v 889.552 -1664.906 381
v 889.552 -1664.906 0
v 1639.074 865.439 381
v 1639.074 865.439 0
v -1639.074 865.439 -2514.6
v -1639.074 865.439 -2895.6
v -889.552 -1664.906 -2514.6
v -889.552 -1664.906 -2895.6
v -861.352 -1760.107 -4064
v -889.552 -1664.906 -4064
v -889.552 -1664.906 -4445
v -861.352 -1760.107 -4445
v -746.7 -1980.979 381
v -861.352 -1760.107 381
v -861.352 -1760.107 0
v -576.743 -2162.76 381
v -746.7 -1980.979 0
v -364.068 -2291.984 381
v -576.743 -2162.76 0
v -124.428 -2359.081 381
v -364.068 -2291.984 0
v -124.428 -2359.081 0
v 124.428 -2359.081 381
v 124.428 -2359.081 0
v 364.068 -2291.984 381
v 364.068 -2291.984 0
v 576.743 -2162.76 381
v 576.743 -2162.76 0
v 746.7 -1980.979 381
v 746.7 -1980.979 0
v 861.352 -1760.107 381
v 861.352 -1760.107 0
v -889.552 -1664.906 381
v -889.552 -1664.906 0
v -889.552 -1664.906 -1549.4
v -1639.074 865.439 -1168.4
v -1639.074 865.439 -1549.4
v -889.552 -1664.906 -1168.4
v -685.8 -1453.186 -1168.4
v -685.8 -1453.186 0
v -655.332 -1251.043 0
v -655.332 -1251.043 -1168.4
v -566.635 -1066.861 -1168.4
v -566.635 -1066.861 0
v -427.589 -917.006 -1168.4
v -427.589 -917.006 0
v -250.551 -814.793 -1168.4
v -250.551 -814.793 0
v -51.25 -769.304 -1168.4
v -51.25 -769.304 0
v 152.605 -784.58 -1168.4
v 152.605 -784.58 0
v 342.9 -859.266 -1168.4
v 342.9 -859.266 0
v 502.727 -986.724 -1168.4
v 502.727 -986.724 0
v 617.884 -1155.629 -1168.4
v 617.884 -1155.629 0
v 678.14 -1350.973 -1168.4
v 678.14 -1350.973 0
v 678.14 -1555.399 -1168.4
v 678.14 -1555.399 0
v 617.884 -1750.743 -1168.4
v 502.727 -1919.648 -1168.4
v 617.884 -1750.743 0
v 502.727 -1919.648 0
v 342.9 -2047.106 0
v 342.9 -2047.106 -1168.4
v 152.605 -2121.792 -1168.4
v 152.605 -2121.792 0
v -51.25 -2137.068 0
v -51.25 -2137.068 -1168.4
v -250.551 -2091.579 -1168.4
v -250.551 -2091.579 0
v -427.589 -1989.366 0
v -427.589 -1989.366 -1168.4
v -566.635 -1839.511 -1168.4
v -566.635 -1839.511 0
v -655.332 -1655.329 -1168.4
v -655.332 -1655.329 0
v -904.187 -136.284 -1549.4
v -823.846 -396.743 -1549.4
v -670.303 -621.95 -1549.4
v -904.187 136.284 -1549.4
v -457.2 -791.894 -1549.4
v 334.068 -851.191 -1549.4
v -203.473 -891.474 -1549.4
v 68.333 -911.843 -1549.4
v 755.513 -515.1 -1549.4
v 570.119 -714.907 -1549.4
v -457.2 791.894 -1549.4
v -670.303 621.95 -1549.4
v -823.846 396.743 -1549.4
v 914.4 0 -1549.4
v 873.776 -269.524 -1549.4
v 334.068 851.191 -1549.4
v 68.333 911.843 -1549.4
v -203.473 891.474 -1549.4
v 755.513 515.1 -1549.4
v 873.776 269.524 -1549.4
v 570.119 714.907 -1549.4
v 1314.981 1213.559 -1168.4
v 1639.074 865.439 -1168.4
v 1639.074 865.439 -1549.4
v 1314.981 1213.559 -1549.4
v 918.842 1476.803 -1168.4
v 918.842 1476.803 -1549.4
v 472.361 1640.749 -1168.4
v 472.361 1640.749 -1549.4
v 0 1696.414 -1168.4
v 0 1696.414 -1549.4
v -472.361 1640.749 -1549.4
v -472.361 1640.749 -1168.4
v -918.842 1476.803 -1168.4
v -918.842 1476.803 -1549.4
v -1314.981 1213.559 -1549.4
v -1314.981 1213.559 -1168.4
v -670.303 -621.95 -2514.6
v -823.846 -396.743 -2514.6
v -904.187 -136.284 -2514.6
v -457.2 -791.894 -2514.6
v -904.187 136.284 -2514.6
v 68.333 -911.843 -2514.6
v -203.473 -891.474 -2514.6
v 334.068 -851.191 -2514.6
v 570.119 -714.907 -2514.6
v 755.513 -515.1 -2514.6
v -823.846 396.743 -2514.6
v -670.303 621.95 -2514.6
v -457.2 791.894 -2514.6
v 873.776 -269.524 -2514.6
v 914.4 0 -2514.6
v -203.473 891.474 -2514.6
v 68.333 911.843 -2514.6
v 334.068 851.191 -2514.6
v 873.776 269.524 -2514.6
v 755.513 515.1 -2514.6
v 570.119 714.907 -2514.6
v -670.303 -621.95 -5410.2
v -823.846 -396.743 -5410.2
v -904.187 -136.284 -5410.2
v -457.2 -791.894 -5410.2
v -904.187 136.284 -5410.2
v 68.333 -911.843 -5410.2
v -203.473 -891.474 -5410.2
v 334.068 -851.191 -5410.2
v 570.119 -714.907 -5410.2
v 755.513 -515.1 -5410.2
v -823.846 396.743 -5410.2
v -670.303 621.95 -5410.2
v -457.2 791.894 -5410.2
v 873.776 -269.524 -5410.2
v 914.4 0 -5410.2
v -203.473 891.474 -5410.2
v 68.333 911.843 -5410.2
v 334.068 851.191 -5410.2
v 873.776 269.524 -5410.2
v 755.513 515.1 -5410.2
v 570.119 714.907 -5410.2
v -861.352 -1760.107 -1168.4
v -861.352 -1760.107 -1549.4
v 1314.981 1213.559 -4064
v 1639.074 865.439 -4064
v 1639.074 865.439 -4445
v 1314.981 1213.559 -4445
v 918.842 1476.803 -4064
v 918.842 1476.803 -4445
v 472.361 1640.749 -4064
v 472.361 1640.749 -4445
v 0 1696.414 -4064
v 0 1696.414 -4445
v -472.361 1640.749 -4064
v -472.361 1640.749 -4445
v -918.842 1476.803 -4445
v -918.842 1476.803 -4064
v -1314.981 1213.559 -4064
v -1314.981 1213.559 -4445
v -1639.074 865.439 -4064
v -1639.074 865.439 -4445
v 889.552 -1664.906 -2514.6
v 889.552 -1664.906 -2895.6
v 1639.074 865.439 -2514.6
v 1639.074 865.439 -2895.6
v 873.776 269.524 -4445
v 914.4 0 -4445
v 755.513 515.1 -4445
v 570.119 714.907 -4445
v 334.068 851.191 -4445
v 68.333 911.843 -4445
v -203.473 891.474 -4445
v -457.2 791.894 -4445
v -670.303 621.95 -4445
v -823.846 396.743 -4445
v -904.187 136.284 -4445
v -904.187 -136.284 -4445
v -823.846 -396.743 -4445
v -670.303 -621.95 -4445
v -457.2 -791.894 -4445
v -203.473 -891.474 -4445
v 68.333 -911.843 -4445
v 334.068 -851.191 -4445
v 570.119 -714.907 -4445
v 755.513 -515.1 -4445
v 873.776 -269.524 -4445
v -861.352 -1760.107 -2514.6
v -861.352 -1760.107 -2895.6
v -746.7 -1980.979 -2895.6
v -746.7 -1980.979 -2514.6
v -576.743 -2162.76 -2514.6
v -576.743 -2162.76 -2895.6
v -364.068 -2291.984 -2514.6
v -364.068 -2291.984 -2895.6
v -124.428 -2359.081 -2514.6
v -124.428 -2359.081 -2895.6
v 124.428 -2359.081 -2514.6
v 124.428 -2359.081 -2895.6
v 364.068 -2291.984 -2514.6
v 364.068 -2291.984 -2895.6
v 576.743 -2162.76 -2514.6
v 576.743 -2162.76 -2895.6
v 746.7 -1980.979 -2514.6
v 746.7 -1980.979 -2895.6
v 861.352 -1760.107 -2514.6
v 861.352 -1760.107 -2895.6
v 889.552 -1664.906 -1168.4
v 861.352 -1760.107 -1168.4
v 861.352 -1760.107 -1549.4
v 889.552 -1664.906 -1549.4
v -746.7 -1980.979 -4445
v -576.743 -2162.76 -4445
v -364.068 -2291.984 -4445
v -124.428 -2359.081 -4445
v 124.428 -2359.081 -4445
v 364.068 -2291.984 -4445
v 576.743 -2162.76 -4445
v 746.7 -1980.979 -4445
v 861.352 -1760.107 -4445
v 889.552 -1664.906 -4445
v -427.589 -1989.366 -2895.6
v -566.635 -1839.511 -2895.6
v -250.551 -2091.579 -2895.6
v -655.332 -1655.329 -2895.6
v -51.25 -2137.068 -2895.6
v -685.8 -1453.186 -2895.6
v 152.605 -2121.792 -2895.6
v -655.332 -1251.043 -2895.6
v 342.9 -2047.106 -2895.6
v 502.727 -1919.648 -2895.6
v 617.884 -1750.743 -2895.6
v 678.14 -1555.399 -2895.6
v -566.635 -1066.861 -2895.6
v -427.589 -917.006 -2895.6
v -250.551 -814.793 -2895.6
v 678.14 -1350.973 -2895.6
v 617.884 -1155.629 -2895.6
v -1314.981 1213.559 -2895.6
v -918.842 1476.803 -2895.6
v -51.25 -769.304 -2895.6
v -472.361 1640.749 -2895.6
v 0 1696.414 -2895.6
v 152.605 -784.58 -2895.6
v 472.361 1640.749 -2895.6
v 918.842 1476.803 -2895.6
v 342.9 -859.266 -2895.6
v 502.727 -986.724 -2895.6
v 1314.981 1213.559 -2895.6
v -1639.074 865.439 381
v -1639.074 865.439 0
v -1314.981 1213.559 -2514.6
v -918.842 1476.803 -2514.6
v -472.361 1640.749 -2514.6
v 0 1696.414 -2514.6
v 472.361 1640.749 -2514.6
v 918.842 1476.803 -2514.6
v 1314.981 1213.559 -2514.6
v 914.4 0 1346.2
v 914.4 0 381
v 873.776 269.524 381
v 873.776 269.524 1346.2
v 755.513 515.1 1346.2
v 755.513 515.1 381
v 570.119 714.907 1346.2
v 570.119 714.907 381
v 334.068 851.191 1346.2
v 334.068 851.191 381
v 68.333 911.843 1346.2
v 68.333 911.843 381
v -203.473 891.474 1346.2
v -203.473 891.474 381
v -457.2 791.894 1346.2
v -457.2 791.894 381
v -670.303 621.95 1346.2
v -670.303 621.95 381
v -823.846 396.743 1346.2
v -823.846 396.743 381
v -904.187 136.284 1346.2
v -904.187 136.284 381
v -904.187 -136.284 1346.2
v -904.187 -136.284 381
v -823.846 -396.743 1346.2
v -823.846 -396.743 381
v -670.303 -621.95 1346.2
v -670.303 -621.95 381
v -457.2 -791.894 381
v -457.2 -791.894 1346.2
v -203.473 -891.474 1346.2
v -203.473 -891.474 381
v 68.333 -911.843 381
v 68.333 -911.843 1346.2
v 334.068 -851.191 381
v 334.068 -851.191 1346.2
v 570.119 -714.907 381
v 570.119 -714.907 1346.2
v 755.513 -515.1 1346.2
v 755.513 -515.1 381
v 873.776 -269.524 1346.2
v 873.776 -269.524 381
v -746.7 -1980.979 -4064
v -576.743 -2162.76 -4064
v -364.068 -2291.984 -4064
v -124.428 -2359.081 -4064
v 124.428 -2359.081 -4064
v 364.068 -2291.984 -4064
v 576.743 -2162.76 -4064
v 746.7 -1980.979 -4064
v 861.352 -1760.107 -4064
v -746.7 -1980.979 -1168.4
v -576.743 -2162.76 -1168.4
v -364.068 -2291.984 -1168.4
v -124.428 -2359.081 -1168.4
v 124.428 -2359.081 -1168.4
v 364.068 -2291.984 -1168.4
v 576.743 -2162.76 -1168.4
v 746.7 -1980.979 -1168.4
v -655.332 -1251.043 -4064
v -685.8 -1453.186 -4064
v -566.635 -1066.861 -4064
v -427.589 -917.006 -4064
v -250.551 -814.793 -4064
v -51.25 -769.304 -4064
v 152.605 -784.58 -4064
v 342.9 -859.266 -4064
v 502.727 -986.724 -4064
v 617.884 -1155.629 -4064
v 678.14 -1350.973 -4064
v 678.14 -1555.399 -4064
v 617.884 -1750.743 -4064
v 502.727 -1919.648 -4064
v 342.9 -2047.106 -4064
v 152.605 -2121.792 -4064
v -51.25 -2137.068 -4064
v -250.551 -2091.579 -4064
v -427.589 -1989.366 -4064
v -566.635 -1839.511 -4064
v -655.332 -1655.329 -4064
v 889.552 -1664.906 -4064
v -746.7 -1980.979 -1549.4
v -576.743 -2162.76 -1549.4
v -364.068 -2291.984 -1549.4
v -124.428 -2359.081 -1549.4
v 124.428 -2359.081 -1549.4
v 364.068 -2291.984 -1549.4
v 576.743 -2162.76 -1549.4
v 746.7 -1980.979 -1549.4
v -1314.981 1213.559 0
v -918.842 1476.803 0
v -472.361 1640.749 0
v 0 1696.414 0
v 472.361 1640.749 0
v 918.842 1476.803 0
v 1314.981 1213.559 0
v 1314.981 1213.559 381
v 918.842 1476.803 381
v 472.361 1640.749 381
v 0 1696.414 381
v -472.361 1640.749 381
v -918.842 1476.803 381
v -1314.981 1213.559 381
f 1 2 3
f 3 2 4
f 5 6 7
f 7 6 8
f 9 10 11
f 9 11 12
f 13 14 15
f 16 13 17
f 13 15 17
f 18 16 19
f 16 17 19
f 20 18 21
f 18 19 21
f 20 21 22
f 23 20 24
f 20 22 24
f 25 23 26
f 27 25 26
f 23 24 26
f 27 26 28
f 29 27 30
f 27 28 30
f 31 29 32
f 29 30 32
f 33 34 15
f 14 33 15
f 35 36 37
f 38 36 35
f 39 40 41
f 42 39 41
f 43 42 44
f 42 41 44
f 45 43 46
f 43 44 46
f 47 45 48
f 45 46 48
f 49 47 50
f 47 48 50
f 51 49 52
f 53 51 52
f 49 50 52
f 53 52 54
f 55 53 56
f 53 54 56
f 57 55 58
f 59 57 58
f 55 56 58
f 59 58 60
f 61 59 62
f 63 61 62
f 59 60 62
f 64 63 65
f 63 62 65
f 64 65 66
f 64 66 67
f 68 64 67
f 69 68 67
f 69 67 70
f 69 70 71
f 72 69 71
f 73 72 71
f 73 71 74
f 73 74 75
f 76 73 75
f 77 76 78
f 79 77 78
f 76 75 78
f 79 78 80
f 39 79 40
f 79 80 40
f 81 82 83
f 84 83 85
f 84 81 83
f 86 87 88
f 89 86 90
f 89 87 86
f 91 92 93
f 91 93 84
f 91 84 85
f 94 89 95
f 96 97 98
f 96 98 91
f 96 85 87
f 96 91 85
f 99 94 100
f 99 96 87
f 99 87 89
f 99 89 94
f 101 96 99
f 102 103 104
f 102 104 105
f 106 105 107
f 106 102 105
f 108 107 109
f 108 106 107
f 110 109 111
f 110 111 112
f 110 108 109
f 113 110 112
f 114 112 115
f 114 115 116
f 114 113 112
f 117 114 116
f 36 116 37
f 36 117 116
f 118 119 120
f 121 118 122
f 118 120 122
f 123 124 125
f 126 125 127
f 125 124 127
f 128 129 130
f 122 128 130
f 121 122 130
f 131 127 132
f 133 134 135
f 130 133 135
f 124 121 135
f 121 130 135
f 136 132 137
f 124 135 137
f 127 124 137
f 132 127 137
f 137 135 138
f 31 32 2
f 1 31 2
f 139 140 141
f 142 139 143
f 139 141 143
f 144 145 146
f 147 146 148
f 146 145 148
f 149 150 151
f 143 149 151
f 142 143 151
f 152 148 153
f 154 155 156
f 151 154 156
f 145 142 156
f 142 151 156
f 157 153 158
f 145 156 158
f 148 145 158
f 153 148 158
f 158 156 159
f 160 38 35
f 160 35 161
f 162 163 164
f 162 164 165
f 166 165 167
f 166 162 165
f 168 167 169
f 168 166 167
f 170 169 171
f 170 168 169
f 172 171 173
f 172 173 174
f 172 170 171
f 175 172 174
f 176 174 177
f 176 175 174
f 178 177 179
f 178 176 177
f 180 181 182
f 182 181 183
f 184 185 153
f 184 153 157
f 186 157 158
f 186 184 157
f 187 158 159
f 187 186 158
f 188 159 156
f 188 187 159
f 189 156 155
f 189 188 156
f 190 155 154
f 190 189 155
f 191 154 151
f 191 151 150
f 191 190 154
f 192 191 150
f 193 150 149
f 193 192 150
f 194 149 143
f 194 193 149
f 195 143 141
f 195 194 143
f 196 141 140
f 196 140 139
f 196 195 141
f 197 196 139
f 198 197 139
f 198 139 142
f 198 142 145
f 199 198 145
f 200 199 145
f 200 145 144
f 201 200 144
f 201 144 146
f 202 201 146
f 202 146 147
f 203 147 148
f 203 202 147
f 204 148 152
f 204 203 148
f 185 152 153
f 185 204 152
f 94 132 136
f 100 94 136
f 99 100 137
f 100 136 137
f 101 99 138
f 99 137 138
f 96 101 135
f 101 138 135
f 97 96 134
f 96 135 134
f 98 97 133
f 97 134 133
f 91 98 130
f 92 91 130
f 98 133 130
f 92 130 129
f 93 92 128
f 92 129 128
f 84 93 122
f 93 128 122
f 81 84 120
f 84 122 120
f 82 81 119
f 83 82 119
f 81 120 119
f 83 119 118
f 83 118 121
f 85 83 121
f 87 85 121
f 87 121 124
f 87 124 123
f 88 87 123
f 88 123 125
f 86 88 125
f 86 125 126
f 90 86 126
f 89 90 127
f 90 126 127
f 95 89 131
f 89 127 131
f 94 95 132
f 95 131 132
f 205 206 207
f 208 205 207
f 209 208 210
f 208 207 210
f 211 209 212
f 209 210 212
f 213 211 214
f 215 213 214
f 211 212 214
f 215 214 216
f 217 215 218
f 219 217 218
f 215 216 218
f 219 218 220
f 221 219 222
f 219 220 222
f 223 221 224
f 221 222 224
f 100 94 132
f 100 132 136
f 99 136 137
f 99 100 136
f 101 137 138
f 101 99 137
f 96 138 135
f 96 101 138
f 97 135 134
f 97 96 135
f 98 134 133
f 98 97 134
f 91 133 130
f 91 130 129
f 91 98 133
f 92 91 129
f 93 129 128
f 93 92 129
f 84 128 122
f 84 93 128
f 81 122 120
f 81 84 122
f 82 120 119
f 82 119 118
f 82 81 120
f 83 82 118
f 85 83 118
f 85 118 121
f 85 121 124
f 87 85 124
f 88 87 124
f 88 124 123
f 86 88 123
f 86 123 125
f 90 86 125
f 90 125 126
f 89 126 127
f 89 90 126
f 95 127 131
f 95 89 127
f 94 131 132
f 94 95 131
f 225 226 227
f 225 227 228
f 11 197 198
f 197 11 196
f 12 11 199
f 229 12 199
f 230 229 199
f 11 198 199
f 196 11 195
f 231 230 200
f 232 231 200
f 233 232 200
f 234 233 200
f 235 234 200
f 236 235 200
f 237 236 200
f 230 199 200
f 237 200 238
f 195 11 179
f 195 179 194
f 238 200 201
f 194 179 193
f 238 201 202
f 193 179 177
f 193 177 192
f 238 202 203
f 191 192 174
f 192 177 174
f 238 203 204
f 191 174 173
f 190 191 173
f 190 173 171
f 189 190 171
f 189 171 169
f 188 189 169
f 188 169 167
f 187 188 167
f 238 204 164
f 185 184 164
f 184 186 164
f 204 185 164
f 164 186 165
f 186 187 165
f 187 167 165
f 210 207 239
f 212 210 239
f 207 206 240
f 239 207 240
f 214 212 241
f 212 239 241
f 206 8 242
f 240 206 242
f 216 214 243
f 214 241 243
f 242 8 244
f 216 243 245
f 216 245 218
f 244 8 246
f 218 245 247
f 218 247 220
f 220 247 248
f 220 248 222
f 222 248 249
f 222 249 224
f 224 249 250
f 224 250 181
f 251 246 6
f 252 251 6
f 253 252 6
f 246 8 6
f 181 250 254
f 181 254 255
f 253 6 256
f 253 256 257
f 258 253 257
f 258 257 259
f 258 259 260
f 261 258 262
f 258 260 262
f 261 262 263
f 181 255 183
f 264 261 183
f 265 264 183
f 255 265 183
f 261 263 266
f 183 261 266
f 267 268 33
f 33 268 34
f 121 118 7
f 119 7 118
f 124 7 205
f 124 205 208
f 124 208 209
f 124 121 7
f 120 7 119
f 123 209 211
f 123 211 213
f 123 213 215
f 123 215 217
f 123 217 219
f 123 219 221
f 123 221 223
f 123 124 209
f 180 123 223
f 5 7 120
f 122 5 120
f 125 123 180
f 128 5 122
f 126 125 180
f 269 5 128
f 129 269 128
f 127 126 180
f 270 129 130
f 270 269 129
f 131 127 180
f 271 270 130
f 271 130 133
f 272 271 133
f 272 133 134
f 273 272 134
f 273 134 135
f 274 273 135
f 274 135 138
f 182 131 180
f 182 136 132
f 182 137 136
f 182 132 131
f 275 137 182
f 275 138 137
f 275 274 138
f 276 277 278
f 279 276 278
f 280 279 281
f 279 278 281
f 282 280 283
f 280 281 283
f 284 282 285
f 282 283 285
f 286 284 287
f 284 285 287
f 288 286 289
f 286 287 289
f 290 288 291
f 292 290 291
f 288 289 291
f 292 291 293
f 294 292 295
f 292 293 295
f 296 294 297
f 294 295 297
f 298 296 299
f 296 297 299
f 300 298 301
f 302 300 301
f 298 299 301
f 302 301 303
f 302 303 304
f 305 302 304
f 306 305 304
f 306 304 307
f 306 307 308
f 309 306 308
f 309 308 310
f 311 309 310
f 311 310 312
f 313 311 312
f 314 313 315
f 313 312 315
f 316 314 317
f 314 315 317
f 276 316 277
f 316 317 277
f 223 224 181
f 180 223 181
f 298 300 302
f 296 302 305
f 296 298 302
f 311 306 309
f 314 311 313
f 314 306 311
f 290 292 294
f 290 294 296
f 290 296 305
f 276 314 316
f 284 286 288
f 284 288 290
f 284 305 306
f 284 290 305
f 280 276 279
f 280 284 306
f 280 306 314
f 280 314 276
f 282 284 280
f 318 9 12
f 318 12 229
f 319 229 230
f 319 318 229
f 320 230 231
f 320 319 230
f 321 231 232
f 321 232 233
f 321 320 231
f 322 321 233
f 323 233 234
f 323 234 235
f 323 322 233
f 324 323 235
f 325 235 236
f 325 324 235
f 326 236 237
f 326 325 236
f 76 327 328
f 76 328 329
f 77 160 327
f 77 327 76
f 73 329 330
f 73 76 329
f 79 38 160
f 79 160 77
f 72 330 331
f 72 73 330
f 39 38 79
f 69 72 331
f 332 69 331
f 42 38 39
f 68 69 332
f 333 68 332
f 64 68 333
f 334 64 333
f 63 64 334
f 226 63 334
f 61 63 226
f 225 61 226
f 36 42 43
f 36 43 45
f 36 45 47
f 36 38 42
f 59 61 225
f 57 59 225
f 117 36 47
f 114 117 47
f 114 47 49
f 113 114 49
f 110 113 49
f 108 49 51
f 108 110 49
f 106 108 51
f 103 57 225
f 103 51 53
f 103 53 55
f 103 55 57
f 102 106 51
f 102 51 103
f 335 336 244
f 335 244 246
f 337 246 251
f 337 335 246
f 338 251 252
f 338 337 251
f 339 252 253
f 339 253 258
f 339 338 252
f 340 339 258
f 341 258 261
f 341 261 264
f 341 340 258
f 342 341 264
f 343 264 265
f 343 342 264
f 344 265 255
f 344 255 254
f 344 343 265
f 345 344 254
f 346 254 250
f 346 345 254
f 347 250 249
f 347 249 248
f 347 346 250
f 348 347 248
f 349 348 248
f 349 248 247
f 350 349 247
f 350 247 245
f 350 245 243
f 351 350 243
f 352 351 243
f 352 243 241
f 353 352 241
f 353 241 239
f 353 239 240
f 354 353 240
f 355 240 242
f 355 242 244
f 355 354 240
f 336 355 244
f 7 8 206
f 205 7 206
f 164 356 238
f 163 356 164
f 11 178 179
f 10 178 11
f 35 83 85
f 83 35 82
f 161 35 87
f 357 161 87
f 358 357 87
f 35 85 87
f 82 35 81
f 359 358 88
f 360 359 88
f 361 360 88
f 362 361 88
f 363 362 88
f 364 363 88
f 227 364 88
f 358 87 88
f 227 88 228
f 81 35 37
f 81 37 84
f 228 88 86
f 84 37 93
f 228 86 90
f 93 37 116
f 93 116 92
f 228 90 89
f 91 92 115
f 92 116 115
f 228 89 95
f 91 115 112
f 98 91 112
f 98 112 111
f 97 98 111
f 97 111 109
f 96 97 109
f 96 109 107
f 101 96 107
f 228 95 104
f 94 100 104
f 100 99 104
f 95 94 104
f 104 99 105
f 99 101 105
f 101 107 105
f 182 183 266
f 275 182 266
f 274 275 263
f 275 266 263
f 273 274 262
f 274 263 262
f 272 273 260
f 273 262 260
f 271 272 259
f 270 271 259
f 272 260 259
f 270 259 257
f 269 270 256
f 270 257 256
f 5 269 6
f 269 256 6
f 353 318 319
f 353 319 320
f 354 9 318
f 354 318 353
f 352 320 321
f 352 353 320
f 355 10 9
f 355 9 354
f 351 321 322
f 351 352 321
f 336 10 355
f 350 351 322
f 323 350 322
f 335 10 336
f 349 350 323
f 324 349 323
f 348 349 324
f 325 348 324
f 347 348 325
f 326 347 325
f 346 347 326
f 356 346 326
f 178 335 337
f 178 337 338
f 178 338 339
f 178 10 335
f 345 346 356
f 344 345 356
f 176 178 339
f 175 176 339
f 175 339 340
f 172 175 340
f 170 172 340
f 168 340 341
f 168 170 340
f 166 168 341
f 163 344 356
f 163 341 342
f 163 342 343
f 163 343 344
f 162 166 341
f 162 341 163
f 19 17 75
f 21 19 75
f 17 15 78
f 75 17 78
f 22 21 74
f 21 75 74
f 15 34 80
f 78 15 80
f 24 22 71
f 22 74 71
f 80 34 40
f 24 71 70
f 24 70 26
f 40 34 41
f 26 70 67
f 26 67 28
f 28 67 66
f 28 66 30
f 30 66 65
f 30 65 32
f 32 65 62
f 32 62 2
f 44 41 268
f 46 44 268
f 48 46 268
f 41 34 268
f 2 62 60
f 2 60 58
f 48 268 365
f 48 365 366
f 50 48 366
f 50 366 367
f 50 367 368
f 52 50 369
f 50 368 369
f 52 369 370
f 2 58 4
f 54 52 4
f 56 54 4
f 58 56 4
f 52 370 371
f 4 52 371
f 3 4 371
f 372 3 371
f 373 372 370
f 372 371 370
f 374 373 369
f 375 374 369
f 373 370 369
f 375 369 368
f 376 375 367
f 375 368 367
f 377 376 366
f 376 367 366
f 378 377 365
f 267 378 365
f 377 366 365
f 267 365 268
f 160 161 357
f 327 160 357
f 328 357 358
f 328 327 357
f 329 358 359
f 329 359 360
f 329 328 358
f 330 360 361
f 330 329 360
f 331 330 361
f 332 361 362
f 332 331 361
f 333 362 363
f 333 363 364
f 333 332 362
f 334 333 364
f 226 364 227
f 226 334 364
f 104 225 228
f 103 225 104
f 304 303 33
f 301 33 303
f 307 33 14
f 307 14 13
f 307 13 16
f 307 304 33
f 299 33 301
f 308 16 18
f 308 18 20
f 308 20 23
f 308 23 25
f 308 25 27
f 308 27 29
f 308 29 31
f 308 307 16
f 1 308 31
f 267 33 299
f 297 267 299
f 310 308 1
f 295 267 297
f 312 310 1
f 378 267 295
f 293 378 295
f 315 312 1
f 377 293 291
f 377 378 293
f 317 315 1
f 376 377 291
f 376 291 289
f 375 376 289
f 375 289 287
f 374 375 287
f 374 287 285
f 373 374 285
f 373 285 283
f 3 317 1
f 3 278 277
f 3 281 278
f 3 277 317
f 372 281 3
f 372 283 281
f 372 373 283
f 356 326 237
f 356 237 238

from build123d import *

# Parameters (mm, degrees)
BOSS_EXTRUDE1_DEPTH = 381
SKETCH3_R           = 685.8
BOSS_EXTRUDE2_DEPTH = 1168.4
SKETCH4_R           = 914.4
BOSS_EXTRUDE3_DEPTH = 965.2


with BuildPart() as part:
    # Sketch2 → Boss-Extrude1 (new body)
    with BuildSketch(Plane.XY):
        with BuildLine():
            ThreePointArc((1639.073881445, 865.438888575), (0, 1696.413988265), (-1639.073881445, 865.438888575))
            Line((-1639.073881445, 865.438888575), (-889.551566195, -1664.906041679))
            ThreePointArc((-889.551566195, -1664.906041679), (-106.586602983, -545.019366199), (914.4, -1453.186011735))
            ThreePointArc((914.4, -1453.186011735), (908.166645536, -1559.772614718), (889.551566195, -1664.906041679))
            Line((889.551566195, -1664.906041679), (1639.073881445, 865.438888575))
        make_face()
        with BuildLine():
            ThreePointArc((914.4, -1453.186011735), (-106.586602983, -545.019366199), (-889.551566195, -1664.906041679))
            Line((-889.551566195, -1664.906041679), (-861.35171004, -1760.107160586))
            ThreePointArc((-861.35171004, -1760.107160586), (0, -2367.586011735), (861.35171004, -1760.107160586))
            Line((861.35171004, -1760.107160586), (889.551566195, -1664.906041679))
            ThreePointArc((889.551566195, -1664.906041679), (908.166645536, -1559.772614718), (914.4, -1453.186011735))
        make_face()
    extrude(amount=BOSS_EXTRUDE1_DEPTH)

    # Sketch3 → Boss-Extrude2 (add)
    with BuildSketch(Plane(origin=(0, 0, 0), x_dir=(-1, 0, 0), z_dir=(0, 0, -1))):
        with Locations((0, -1453.186011735)):
            Circle(SKETCH3_R)
    extrude(amount=BOSS_EXTRUDE2_DEPTH)

    # Sketch4 → Boss-Extrude3 (add)
    with BuildSketch(Plane.XY.offset(381)):
        Circle(SKETCH4_R)
    extrude(amount=BOSS_EXTRUDE3_DEPTH)

    # Mirror1: part across plane


with BuildPart() as part_1:
    add(part.part)
    add(part.part.mirror(Plane(origin=(0, 0, -584.2), x_dir=(1, 0, 0), z_dir=(0, 0, -1))))


with BuildPart() as body_2:
    # Mirror2: mirrored copy
    add(part_1.part.mirror(Plane(origin=(0, 0, -2032), x_dir=(1, 0, 0), z_dir=(0, 0, -1))))


solid = Compound([part_1.part, body_2.part])
